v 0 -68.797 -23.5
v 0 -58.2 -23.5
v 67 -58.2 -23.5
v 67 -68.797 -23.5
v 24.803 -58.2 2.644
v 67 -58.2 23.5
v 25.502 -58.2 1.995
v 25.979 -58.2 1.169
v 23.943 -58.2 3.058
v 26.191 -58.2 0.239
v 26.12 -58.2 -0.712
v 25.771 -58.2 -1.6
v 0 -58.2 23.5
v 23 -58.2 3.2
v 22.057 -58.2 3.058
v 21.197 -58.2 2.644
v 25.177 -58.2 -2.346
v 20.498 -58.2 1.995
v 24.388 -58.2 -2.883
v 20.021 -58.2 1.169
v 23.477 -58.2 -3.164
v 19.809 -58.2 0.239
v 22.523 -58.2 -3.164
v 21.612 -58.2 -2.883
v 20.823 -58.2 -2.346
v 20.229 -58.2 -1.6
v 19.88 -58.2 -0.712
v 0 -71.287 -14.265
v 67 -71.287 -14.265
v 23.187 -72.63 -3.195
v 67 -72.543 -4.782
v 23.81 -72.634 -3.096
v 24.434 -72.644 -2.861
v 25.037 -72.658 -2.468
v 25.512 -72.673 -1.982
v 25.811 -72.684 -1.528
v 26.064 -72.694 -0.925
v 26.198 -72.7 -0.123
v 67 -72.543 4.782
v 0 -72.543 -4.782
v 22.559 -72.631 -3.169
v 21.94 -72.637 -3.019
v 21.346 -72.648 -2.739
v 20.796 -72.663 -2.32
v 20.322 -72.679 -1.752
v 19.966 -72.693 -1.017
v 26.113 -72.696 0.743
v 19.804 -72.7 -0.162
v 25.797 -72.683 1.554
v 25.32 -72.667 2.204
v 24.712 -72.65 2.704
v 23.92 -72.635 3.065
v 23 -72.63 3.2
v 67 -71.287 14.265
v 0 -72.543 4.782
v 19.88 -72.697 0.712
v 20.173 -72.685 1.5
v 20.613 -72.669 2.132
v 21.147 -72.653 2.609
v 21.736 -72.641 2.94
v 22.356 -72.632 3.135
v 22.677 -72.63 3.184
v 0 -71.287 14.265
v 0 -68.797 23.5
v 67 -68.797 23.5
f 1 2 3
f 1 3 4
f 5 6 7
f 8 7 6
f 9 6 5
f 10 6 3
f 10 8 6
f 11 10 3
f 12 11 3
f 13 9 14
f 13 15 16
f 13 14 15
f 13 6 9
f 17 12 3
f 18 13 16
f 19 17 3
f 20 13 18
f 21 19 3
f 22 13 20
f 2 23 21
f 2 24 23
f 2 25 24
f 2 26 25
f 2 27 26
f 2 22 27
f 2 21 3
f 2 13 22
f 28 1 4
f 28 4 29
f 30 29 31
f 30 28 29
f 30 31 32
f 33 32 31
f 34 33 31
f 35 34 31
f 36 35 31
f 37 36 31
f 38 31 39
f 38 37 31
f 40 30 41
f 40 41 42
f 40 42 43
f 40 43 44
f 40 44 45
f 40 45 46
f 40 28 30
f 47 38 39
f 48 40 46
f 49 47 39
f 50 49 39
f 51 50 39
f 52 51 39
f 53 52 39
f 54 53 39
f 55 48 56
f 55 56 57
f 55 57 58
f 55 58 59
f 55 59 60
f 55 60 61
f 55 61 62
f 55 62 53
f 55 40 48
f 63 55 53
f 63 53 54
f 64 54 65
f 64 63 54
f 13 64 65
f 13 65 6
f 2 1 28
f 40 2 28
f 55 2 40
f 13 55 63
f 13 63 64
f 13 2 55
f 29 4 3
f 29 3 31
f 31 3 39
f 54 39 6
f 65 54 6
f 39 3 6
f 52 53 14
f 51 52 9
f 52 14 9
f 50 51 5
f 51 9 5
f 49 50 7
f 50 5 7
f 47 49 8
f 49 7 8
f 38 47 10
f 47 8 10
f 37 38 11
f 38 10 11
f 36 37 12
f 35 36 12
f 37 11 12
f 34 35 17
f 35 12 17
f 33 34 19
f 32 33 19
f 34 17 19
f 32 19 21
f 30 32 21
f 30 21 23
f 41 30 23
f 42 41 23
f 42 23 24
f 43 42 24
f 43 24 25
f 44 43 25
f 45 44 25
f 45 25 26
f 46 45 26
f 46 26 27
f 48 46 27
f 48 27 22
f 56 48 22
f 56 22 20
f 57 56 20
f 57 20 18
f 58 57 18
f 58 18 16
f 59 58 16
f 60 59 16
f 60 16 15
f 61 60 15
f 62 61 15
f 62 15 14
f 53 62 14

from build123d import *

# Parameters (mm, degrees)
BOSS_EXTRUDE1_DEPTH = 67
SKETCH2_R           = 3.2
CUT_EXTRUDE1_DEPTH  = 73.467233975


with BuildPart() as part:
    # Sketch1 → Boss-Extrude1 (new body)
    with BuildSketch(Plane(origin=(0, 0, 0), x_dir=(0, 0, -1), z_dir=(1, 0, 0))):
        with BuildLine():
            Line((-23.5, -58.2), (23.5, -58.2))
            Line((23.5, -58.2), (23.5, -68.797092962))
            ThreePointArc((23.5, -68.797092962), (0, -72.7), (-23.5, -68.797092962))
            Line((-23.5, -68.797092962), (-23.5, -58.2))
        make_face()
    extrude(amount=BOSS_EXTRUDE1_DEPTH)

    # Sketch2 → Cut-Extrude1 (cut, through all)
    with BuildSketch(Plane(origin=(0, -58.2, 0), x_dir=(1, 0, 0), z_dir=(0, 1, 0))):
        with Locations(Location((23, 0, 0), (0, 0, 270))):
            Circle(SKETCH2_R)
    extrude(amount=-CUT_EXTRUDE1_DEPTH, mode=Mode.SUBTRACT)


solid = part.part
